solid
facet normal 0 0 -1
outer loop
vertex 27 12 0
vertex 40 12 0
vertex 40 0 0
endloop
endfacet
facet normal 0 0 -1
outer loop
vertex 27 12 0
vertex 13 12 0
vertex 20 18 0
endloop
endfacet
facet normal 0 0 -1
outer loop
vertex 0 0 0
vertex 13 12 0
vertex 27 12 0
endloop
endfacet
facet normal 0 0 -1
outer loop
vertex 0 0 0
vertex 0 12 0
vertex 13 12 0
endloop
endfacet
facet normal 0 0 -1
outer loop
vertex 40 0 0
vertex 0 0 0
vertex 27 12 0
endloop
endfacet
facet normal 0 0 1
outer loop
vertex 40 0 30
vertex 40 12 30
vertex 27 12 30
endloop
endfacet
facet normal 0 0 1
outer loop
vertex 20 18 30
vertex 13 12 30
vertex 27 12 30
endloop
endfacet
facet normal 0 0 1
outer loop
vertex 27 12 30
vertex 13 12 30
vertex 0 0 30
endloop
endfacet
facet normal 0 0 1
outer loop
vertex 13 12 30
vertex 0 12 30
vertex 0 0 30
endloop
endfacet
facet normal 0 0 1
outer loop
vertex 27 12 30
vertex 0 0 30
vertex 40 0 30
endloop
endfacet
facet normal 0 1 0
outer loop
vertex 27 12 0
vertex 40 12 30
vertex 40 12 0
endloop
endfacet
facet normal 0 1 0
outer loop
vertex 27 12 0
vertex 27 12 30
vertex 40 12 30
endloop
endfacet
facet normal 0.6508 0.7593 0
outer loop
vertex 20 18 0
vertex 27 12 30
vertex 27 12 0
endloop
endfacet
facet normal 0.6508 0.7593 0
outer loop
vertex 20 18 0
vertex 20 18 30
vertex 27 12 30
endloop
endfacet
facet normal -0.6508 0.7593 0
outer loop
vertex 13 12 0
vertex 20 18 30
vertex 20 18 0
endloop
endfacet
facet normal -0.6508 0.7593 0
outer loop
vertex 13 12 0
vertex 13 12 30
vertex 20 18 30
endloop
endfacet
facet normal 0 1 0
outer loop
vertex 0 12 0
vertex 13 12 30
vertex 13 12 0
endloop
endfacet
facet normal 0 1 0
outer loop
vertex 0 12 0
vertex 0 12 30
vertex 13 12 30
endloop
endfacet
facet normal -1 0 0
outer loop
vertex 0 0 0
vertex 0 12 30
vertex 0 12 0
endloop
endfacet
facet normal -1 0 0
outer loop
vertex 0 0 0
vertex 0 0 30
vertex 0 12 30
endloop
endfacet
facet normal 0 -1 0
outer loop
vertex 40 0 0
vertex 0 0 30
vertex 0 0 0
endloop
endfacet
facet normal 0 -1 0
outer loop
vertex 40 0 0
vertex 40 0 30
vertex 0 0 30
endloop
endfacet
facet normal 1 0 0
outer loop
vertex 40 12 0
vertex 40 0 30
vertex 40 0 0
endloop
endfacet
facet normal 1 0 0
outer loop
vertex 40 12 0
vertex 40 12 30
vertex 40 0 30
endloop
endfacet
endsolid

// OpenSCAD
$fn = 32;

// ----------------------------------------------------------------------
// V guide rail: vrib, 40 mm wide
// ----------------------------------------------------------------------

// --- parameters (mm) ---
rail_w = 40;              // rail width, X
base_t = 12;              // base plate thickness
v_depth = 6;              // V feature depth / height
v_half_w = 7;             // half width of the V at the base face
plate_t = 30;             // rail length, Z (the extrusion height)

profile = [[0, 0], [40, 0], [40, 12], [27, 12], [20, 18], [13, 12], [0, 12]];  // primary outline, 7 points, counter clockwise

// --- the one profile operation ---
linear_extrude(height = plate_t) polygon(points = profile);
